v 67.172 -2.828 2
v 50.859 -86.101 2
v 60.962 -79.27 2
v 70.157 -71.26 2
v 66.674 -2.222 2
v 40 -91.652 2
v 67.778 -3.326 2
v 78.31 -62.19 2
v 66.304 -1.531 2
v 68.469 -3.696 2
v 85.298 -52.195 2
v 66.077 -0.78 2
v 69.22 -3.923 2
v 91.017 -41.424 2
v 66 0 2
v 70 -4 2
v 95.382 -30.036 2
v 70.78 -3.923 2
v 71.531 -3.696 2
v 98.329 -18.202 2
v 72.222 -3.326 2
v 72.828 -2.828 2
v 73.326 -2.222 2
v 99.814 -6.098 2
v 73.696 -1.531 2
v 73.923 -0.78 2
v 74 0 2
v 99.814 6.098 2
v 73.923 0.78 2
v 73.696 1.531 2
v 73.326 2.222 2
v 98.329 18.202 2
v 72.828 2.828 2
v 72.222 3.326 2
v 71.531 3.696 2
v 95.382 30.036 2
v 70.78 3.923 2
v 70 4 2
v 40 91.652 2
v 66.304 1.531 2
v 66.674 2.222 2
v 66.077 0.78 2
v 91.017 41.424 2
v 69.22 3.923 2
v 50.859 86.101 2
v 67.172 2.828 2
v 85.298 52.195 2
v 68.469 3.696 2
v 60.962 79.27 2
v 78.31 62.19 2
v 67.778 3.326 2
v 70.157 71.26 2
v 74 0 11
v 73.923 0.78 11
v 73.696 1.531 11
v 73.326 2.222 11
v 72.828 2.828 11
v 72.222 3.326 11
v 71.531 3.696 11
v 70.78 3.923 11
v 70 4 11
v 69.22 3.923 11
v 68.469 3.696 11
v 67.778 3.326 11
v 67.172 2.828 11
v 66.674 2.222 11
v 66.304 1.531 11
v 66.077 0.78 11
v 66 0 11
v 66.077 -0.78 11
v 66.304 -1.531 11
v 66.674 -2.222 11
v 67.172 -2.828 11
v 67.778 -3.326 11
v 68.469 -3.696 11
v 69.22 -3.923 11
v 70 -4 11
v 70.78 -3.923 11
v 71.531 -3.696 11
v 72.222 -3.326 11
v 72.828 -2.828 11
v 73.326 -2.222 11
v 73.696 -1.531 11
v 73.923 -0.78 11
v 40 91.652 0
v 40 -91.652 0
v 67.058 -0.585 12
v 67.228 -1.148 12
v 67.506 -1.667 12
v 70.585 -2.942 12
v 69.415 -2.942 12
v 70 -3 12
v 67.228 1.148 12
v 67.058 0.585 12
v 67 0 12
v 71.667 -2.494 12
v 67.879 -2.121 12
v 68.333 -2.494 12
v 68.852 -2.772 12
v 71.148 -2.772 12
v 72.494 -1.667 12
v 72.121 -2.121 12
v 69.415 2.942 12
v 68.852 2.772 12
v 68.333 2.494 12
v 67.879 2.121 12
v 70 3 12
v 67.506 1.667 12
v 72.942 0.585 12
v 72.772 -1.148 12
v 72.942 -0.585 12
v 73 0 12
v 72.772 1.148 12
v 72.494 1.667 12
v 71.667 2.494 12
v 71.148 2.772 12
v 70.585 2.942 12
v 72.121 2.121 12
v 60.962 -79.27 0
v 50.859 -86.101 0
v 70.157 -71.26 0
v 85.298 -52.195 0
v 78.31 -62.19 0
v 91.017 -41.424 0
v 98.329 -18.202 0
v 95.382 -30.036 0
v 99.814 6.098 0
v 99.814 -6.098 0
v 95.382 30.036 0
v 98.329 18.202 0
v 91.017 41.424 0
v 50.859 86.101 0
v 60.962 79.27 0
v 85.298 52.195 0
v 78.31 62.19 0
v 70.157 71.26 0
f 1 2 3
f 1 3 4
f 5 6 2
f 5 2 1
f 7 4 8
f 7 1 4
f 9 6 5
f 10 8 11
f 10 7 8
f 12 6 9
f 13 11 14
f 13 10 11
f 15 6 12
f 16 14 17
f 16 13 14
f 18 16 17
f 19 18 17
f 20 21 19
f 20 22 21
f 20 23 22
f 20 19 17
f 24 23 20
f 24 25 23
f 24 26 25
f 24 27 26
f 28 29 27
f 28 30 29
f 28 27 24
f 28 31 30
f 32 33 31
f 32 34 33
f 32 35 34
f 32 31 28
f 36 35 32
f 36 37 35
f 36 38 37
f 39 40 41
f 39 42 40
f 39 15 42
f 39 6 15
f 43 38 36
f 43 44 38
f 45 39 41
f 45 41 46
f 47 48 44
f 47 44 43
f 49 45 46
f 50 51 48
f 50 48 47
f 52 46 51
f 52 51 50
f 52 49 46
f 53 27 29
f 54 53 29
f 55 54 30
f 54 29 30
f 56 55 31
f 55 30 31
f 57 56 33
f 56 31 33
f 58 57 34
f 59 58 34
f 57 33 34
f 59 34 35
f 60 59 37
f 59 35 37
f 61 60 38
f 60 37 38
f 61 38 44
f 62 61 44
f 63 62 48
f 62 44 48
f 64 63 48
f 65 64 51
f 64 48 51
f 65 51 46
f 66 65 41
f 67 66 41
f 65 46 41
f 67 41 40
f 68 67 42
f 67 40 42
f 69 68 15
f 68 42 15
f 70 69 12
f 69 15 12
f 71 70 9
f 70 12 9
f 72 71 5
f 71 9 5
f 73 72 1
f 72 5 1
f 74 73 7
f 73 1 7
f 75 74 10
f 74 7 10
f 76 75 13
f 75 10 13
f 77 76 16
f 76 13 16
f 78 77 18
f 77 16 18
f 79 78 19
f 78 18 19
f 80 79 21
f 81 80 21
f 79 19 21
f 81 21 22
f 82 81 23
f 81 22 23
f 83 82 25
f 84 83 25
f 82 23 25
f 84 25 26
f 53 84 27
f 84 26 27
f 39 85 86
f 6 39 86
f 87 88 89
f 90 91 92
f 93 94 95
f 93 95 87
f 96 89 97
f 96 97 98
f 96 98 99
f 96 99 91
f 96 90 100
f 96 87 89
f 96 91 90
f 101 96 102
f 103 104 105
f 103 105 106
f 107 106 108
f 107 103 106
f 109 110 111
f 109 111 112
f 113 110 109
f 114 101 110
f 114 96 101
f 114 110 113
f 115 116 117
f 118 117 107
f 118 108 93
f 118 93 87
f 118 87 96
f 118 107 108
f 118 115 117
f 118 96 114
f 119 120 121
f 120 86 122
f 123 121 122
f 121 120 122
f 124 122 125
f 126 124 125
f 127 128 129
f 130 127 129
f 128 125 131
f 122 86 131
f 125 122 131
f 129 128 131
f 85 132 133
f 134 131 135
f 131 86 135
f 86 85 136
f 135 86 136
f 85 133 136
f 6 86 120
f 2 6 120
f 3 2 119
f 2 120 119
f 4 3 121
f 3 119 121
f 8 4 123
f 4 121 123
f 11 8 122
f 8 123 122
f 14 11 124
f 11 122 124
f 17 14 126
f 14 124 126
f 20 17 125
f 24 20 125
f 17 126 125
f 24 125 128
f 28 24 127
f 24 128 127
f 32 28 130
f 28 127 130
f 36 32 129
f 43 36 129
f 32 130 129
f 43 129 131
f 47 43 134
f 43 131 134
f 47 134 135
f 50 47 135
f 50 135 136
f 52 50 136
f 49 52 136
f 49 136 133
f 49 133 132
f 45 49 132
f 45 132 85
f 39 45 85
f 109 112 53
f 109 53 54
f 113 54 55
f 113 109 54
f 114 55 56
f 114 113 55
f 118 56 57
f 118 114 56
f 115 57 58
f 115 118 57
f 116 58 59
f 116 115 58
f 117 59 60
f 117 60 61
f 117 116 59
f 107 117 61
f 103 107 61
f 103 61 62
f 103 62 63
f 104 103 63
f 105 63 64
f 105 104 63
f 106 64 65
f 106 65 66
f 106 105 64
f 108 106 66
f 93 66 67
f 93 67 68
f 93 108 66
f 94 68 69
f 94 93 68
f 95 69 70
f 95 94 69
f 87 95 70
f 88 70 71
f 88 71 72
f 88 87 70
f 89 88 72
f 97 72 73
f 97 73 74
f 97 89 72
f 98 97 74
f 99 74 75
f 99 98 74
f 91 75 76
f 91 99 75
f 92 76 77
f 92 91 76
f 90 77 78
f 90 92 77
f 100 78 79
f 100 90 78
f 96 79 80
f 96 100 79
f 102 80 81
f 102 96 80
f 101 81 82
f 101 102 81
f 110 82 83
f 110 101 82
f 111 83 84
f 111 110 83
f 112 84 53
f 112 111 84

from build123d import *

# Parameters (mm, degrees)
F1_DEPTH = 2
F2_R     = 4
F3_DEPTH = 10
F4_SIZE  = 1


with BuildPart() as f1:
    # F0 (on Top) → F1 (new body)
    with BuildSketch(Plane.XY):
        with BuildLine():
            Line((40, 91.651514), (40, -91.651514))
            ThreePointArc((40, -91.651514), (100, 0), (40, 91.651514))
        make_face()
    extrude(amount=F1_DEPTH)

    # F2 (on face) → F3 (join)
    with BuildSketch(Plane.XY.offset(2)):
        with Locations((70, 0)):
            Circle(F2_R)
    extrude(amount=F3_DEPTH)

    # F4
    f4_edges = [f1.edges().sort_by_distance(p)[0] for p in [
        (66, 0, 12),
    ]]
    chamfer(f4_edges, length=F4_SIZE)


solid = f1.part
